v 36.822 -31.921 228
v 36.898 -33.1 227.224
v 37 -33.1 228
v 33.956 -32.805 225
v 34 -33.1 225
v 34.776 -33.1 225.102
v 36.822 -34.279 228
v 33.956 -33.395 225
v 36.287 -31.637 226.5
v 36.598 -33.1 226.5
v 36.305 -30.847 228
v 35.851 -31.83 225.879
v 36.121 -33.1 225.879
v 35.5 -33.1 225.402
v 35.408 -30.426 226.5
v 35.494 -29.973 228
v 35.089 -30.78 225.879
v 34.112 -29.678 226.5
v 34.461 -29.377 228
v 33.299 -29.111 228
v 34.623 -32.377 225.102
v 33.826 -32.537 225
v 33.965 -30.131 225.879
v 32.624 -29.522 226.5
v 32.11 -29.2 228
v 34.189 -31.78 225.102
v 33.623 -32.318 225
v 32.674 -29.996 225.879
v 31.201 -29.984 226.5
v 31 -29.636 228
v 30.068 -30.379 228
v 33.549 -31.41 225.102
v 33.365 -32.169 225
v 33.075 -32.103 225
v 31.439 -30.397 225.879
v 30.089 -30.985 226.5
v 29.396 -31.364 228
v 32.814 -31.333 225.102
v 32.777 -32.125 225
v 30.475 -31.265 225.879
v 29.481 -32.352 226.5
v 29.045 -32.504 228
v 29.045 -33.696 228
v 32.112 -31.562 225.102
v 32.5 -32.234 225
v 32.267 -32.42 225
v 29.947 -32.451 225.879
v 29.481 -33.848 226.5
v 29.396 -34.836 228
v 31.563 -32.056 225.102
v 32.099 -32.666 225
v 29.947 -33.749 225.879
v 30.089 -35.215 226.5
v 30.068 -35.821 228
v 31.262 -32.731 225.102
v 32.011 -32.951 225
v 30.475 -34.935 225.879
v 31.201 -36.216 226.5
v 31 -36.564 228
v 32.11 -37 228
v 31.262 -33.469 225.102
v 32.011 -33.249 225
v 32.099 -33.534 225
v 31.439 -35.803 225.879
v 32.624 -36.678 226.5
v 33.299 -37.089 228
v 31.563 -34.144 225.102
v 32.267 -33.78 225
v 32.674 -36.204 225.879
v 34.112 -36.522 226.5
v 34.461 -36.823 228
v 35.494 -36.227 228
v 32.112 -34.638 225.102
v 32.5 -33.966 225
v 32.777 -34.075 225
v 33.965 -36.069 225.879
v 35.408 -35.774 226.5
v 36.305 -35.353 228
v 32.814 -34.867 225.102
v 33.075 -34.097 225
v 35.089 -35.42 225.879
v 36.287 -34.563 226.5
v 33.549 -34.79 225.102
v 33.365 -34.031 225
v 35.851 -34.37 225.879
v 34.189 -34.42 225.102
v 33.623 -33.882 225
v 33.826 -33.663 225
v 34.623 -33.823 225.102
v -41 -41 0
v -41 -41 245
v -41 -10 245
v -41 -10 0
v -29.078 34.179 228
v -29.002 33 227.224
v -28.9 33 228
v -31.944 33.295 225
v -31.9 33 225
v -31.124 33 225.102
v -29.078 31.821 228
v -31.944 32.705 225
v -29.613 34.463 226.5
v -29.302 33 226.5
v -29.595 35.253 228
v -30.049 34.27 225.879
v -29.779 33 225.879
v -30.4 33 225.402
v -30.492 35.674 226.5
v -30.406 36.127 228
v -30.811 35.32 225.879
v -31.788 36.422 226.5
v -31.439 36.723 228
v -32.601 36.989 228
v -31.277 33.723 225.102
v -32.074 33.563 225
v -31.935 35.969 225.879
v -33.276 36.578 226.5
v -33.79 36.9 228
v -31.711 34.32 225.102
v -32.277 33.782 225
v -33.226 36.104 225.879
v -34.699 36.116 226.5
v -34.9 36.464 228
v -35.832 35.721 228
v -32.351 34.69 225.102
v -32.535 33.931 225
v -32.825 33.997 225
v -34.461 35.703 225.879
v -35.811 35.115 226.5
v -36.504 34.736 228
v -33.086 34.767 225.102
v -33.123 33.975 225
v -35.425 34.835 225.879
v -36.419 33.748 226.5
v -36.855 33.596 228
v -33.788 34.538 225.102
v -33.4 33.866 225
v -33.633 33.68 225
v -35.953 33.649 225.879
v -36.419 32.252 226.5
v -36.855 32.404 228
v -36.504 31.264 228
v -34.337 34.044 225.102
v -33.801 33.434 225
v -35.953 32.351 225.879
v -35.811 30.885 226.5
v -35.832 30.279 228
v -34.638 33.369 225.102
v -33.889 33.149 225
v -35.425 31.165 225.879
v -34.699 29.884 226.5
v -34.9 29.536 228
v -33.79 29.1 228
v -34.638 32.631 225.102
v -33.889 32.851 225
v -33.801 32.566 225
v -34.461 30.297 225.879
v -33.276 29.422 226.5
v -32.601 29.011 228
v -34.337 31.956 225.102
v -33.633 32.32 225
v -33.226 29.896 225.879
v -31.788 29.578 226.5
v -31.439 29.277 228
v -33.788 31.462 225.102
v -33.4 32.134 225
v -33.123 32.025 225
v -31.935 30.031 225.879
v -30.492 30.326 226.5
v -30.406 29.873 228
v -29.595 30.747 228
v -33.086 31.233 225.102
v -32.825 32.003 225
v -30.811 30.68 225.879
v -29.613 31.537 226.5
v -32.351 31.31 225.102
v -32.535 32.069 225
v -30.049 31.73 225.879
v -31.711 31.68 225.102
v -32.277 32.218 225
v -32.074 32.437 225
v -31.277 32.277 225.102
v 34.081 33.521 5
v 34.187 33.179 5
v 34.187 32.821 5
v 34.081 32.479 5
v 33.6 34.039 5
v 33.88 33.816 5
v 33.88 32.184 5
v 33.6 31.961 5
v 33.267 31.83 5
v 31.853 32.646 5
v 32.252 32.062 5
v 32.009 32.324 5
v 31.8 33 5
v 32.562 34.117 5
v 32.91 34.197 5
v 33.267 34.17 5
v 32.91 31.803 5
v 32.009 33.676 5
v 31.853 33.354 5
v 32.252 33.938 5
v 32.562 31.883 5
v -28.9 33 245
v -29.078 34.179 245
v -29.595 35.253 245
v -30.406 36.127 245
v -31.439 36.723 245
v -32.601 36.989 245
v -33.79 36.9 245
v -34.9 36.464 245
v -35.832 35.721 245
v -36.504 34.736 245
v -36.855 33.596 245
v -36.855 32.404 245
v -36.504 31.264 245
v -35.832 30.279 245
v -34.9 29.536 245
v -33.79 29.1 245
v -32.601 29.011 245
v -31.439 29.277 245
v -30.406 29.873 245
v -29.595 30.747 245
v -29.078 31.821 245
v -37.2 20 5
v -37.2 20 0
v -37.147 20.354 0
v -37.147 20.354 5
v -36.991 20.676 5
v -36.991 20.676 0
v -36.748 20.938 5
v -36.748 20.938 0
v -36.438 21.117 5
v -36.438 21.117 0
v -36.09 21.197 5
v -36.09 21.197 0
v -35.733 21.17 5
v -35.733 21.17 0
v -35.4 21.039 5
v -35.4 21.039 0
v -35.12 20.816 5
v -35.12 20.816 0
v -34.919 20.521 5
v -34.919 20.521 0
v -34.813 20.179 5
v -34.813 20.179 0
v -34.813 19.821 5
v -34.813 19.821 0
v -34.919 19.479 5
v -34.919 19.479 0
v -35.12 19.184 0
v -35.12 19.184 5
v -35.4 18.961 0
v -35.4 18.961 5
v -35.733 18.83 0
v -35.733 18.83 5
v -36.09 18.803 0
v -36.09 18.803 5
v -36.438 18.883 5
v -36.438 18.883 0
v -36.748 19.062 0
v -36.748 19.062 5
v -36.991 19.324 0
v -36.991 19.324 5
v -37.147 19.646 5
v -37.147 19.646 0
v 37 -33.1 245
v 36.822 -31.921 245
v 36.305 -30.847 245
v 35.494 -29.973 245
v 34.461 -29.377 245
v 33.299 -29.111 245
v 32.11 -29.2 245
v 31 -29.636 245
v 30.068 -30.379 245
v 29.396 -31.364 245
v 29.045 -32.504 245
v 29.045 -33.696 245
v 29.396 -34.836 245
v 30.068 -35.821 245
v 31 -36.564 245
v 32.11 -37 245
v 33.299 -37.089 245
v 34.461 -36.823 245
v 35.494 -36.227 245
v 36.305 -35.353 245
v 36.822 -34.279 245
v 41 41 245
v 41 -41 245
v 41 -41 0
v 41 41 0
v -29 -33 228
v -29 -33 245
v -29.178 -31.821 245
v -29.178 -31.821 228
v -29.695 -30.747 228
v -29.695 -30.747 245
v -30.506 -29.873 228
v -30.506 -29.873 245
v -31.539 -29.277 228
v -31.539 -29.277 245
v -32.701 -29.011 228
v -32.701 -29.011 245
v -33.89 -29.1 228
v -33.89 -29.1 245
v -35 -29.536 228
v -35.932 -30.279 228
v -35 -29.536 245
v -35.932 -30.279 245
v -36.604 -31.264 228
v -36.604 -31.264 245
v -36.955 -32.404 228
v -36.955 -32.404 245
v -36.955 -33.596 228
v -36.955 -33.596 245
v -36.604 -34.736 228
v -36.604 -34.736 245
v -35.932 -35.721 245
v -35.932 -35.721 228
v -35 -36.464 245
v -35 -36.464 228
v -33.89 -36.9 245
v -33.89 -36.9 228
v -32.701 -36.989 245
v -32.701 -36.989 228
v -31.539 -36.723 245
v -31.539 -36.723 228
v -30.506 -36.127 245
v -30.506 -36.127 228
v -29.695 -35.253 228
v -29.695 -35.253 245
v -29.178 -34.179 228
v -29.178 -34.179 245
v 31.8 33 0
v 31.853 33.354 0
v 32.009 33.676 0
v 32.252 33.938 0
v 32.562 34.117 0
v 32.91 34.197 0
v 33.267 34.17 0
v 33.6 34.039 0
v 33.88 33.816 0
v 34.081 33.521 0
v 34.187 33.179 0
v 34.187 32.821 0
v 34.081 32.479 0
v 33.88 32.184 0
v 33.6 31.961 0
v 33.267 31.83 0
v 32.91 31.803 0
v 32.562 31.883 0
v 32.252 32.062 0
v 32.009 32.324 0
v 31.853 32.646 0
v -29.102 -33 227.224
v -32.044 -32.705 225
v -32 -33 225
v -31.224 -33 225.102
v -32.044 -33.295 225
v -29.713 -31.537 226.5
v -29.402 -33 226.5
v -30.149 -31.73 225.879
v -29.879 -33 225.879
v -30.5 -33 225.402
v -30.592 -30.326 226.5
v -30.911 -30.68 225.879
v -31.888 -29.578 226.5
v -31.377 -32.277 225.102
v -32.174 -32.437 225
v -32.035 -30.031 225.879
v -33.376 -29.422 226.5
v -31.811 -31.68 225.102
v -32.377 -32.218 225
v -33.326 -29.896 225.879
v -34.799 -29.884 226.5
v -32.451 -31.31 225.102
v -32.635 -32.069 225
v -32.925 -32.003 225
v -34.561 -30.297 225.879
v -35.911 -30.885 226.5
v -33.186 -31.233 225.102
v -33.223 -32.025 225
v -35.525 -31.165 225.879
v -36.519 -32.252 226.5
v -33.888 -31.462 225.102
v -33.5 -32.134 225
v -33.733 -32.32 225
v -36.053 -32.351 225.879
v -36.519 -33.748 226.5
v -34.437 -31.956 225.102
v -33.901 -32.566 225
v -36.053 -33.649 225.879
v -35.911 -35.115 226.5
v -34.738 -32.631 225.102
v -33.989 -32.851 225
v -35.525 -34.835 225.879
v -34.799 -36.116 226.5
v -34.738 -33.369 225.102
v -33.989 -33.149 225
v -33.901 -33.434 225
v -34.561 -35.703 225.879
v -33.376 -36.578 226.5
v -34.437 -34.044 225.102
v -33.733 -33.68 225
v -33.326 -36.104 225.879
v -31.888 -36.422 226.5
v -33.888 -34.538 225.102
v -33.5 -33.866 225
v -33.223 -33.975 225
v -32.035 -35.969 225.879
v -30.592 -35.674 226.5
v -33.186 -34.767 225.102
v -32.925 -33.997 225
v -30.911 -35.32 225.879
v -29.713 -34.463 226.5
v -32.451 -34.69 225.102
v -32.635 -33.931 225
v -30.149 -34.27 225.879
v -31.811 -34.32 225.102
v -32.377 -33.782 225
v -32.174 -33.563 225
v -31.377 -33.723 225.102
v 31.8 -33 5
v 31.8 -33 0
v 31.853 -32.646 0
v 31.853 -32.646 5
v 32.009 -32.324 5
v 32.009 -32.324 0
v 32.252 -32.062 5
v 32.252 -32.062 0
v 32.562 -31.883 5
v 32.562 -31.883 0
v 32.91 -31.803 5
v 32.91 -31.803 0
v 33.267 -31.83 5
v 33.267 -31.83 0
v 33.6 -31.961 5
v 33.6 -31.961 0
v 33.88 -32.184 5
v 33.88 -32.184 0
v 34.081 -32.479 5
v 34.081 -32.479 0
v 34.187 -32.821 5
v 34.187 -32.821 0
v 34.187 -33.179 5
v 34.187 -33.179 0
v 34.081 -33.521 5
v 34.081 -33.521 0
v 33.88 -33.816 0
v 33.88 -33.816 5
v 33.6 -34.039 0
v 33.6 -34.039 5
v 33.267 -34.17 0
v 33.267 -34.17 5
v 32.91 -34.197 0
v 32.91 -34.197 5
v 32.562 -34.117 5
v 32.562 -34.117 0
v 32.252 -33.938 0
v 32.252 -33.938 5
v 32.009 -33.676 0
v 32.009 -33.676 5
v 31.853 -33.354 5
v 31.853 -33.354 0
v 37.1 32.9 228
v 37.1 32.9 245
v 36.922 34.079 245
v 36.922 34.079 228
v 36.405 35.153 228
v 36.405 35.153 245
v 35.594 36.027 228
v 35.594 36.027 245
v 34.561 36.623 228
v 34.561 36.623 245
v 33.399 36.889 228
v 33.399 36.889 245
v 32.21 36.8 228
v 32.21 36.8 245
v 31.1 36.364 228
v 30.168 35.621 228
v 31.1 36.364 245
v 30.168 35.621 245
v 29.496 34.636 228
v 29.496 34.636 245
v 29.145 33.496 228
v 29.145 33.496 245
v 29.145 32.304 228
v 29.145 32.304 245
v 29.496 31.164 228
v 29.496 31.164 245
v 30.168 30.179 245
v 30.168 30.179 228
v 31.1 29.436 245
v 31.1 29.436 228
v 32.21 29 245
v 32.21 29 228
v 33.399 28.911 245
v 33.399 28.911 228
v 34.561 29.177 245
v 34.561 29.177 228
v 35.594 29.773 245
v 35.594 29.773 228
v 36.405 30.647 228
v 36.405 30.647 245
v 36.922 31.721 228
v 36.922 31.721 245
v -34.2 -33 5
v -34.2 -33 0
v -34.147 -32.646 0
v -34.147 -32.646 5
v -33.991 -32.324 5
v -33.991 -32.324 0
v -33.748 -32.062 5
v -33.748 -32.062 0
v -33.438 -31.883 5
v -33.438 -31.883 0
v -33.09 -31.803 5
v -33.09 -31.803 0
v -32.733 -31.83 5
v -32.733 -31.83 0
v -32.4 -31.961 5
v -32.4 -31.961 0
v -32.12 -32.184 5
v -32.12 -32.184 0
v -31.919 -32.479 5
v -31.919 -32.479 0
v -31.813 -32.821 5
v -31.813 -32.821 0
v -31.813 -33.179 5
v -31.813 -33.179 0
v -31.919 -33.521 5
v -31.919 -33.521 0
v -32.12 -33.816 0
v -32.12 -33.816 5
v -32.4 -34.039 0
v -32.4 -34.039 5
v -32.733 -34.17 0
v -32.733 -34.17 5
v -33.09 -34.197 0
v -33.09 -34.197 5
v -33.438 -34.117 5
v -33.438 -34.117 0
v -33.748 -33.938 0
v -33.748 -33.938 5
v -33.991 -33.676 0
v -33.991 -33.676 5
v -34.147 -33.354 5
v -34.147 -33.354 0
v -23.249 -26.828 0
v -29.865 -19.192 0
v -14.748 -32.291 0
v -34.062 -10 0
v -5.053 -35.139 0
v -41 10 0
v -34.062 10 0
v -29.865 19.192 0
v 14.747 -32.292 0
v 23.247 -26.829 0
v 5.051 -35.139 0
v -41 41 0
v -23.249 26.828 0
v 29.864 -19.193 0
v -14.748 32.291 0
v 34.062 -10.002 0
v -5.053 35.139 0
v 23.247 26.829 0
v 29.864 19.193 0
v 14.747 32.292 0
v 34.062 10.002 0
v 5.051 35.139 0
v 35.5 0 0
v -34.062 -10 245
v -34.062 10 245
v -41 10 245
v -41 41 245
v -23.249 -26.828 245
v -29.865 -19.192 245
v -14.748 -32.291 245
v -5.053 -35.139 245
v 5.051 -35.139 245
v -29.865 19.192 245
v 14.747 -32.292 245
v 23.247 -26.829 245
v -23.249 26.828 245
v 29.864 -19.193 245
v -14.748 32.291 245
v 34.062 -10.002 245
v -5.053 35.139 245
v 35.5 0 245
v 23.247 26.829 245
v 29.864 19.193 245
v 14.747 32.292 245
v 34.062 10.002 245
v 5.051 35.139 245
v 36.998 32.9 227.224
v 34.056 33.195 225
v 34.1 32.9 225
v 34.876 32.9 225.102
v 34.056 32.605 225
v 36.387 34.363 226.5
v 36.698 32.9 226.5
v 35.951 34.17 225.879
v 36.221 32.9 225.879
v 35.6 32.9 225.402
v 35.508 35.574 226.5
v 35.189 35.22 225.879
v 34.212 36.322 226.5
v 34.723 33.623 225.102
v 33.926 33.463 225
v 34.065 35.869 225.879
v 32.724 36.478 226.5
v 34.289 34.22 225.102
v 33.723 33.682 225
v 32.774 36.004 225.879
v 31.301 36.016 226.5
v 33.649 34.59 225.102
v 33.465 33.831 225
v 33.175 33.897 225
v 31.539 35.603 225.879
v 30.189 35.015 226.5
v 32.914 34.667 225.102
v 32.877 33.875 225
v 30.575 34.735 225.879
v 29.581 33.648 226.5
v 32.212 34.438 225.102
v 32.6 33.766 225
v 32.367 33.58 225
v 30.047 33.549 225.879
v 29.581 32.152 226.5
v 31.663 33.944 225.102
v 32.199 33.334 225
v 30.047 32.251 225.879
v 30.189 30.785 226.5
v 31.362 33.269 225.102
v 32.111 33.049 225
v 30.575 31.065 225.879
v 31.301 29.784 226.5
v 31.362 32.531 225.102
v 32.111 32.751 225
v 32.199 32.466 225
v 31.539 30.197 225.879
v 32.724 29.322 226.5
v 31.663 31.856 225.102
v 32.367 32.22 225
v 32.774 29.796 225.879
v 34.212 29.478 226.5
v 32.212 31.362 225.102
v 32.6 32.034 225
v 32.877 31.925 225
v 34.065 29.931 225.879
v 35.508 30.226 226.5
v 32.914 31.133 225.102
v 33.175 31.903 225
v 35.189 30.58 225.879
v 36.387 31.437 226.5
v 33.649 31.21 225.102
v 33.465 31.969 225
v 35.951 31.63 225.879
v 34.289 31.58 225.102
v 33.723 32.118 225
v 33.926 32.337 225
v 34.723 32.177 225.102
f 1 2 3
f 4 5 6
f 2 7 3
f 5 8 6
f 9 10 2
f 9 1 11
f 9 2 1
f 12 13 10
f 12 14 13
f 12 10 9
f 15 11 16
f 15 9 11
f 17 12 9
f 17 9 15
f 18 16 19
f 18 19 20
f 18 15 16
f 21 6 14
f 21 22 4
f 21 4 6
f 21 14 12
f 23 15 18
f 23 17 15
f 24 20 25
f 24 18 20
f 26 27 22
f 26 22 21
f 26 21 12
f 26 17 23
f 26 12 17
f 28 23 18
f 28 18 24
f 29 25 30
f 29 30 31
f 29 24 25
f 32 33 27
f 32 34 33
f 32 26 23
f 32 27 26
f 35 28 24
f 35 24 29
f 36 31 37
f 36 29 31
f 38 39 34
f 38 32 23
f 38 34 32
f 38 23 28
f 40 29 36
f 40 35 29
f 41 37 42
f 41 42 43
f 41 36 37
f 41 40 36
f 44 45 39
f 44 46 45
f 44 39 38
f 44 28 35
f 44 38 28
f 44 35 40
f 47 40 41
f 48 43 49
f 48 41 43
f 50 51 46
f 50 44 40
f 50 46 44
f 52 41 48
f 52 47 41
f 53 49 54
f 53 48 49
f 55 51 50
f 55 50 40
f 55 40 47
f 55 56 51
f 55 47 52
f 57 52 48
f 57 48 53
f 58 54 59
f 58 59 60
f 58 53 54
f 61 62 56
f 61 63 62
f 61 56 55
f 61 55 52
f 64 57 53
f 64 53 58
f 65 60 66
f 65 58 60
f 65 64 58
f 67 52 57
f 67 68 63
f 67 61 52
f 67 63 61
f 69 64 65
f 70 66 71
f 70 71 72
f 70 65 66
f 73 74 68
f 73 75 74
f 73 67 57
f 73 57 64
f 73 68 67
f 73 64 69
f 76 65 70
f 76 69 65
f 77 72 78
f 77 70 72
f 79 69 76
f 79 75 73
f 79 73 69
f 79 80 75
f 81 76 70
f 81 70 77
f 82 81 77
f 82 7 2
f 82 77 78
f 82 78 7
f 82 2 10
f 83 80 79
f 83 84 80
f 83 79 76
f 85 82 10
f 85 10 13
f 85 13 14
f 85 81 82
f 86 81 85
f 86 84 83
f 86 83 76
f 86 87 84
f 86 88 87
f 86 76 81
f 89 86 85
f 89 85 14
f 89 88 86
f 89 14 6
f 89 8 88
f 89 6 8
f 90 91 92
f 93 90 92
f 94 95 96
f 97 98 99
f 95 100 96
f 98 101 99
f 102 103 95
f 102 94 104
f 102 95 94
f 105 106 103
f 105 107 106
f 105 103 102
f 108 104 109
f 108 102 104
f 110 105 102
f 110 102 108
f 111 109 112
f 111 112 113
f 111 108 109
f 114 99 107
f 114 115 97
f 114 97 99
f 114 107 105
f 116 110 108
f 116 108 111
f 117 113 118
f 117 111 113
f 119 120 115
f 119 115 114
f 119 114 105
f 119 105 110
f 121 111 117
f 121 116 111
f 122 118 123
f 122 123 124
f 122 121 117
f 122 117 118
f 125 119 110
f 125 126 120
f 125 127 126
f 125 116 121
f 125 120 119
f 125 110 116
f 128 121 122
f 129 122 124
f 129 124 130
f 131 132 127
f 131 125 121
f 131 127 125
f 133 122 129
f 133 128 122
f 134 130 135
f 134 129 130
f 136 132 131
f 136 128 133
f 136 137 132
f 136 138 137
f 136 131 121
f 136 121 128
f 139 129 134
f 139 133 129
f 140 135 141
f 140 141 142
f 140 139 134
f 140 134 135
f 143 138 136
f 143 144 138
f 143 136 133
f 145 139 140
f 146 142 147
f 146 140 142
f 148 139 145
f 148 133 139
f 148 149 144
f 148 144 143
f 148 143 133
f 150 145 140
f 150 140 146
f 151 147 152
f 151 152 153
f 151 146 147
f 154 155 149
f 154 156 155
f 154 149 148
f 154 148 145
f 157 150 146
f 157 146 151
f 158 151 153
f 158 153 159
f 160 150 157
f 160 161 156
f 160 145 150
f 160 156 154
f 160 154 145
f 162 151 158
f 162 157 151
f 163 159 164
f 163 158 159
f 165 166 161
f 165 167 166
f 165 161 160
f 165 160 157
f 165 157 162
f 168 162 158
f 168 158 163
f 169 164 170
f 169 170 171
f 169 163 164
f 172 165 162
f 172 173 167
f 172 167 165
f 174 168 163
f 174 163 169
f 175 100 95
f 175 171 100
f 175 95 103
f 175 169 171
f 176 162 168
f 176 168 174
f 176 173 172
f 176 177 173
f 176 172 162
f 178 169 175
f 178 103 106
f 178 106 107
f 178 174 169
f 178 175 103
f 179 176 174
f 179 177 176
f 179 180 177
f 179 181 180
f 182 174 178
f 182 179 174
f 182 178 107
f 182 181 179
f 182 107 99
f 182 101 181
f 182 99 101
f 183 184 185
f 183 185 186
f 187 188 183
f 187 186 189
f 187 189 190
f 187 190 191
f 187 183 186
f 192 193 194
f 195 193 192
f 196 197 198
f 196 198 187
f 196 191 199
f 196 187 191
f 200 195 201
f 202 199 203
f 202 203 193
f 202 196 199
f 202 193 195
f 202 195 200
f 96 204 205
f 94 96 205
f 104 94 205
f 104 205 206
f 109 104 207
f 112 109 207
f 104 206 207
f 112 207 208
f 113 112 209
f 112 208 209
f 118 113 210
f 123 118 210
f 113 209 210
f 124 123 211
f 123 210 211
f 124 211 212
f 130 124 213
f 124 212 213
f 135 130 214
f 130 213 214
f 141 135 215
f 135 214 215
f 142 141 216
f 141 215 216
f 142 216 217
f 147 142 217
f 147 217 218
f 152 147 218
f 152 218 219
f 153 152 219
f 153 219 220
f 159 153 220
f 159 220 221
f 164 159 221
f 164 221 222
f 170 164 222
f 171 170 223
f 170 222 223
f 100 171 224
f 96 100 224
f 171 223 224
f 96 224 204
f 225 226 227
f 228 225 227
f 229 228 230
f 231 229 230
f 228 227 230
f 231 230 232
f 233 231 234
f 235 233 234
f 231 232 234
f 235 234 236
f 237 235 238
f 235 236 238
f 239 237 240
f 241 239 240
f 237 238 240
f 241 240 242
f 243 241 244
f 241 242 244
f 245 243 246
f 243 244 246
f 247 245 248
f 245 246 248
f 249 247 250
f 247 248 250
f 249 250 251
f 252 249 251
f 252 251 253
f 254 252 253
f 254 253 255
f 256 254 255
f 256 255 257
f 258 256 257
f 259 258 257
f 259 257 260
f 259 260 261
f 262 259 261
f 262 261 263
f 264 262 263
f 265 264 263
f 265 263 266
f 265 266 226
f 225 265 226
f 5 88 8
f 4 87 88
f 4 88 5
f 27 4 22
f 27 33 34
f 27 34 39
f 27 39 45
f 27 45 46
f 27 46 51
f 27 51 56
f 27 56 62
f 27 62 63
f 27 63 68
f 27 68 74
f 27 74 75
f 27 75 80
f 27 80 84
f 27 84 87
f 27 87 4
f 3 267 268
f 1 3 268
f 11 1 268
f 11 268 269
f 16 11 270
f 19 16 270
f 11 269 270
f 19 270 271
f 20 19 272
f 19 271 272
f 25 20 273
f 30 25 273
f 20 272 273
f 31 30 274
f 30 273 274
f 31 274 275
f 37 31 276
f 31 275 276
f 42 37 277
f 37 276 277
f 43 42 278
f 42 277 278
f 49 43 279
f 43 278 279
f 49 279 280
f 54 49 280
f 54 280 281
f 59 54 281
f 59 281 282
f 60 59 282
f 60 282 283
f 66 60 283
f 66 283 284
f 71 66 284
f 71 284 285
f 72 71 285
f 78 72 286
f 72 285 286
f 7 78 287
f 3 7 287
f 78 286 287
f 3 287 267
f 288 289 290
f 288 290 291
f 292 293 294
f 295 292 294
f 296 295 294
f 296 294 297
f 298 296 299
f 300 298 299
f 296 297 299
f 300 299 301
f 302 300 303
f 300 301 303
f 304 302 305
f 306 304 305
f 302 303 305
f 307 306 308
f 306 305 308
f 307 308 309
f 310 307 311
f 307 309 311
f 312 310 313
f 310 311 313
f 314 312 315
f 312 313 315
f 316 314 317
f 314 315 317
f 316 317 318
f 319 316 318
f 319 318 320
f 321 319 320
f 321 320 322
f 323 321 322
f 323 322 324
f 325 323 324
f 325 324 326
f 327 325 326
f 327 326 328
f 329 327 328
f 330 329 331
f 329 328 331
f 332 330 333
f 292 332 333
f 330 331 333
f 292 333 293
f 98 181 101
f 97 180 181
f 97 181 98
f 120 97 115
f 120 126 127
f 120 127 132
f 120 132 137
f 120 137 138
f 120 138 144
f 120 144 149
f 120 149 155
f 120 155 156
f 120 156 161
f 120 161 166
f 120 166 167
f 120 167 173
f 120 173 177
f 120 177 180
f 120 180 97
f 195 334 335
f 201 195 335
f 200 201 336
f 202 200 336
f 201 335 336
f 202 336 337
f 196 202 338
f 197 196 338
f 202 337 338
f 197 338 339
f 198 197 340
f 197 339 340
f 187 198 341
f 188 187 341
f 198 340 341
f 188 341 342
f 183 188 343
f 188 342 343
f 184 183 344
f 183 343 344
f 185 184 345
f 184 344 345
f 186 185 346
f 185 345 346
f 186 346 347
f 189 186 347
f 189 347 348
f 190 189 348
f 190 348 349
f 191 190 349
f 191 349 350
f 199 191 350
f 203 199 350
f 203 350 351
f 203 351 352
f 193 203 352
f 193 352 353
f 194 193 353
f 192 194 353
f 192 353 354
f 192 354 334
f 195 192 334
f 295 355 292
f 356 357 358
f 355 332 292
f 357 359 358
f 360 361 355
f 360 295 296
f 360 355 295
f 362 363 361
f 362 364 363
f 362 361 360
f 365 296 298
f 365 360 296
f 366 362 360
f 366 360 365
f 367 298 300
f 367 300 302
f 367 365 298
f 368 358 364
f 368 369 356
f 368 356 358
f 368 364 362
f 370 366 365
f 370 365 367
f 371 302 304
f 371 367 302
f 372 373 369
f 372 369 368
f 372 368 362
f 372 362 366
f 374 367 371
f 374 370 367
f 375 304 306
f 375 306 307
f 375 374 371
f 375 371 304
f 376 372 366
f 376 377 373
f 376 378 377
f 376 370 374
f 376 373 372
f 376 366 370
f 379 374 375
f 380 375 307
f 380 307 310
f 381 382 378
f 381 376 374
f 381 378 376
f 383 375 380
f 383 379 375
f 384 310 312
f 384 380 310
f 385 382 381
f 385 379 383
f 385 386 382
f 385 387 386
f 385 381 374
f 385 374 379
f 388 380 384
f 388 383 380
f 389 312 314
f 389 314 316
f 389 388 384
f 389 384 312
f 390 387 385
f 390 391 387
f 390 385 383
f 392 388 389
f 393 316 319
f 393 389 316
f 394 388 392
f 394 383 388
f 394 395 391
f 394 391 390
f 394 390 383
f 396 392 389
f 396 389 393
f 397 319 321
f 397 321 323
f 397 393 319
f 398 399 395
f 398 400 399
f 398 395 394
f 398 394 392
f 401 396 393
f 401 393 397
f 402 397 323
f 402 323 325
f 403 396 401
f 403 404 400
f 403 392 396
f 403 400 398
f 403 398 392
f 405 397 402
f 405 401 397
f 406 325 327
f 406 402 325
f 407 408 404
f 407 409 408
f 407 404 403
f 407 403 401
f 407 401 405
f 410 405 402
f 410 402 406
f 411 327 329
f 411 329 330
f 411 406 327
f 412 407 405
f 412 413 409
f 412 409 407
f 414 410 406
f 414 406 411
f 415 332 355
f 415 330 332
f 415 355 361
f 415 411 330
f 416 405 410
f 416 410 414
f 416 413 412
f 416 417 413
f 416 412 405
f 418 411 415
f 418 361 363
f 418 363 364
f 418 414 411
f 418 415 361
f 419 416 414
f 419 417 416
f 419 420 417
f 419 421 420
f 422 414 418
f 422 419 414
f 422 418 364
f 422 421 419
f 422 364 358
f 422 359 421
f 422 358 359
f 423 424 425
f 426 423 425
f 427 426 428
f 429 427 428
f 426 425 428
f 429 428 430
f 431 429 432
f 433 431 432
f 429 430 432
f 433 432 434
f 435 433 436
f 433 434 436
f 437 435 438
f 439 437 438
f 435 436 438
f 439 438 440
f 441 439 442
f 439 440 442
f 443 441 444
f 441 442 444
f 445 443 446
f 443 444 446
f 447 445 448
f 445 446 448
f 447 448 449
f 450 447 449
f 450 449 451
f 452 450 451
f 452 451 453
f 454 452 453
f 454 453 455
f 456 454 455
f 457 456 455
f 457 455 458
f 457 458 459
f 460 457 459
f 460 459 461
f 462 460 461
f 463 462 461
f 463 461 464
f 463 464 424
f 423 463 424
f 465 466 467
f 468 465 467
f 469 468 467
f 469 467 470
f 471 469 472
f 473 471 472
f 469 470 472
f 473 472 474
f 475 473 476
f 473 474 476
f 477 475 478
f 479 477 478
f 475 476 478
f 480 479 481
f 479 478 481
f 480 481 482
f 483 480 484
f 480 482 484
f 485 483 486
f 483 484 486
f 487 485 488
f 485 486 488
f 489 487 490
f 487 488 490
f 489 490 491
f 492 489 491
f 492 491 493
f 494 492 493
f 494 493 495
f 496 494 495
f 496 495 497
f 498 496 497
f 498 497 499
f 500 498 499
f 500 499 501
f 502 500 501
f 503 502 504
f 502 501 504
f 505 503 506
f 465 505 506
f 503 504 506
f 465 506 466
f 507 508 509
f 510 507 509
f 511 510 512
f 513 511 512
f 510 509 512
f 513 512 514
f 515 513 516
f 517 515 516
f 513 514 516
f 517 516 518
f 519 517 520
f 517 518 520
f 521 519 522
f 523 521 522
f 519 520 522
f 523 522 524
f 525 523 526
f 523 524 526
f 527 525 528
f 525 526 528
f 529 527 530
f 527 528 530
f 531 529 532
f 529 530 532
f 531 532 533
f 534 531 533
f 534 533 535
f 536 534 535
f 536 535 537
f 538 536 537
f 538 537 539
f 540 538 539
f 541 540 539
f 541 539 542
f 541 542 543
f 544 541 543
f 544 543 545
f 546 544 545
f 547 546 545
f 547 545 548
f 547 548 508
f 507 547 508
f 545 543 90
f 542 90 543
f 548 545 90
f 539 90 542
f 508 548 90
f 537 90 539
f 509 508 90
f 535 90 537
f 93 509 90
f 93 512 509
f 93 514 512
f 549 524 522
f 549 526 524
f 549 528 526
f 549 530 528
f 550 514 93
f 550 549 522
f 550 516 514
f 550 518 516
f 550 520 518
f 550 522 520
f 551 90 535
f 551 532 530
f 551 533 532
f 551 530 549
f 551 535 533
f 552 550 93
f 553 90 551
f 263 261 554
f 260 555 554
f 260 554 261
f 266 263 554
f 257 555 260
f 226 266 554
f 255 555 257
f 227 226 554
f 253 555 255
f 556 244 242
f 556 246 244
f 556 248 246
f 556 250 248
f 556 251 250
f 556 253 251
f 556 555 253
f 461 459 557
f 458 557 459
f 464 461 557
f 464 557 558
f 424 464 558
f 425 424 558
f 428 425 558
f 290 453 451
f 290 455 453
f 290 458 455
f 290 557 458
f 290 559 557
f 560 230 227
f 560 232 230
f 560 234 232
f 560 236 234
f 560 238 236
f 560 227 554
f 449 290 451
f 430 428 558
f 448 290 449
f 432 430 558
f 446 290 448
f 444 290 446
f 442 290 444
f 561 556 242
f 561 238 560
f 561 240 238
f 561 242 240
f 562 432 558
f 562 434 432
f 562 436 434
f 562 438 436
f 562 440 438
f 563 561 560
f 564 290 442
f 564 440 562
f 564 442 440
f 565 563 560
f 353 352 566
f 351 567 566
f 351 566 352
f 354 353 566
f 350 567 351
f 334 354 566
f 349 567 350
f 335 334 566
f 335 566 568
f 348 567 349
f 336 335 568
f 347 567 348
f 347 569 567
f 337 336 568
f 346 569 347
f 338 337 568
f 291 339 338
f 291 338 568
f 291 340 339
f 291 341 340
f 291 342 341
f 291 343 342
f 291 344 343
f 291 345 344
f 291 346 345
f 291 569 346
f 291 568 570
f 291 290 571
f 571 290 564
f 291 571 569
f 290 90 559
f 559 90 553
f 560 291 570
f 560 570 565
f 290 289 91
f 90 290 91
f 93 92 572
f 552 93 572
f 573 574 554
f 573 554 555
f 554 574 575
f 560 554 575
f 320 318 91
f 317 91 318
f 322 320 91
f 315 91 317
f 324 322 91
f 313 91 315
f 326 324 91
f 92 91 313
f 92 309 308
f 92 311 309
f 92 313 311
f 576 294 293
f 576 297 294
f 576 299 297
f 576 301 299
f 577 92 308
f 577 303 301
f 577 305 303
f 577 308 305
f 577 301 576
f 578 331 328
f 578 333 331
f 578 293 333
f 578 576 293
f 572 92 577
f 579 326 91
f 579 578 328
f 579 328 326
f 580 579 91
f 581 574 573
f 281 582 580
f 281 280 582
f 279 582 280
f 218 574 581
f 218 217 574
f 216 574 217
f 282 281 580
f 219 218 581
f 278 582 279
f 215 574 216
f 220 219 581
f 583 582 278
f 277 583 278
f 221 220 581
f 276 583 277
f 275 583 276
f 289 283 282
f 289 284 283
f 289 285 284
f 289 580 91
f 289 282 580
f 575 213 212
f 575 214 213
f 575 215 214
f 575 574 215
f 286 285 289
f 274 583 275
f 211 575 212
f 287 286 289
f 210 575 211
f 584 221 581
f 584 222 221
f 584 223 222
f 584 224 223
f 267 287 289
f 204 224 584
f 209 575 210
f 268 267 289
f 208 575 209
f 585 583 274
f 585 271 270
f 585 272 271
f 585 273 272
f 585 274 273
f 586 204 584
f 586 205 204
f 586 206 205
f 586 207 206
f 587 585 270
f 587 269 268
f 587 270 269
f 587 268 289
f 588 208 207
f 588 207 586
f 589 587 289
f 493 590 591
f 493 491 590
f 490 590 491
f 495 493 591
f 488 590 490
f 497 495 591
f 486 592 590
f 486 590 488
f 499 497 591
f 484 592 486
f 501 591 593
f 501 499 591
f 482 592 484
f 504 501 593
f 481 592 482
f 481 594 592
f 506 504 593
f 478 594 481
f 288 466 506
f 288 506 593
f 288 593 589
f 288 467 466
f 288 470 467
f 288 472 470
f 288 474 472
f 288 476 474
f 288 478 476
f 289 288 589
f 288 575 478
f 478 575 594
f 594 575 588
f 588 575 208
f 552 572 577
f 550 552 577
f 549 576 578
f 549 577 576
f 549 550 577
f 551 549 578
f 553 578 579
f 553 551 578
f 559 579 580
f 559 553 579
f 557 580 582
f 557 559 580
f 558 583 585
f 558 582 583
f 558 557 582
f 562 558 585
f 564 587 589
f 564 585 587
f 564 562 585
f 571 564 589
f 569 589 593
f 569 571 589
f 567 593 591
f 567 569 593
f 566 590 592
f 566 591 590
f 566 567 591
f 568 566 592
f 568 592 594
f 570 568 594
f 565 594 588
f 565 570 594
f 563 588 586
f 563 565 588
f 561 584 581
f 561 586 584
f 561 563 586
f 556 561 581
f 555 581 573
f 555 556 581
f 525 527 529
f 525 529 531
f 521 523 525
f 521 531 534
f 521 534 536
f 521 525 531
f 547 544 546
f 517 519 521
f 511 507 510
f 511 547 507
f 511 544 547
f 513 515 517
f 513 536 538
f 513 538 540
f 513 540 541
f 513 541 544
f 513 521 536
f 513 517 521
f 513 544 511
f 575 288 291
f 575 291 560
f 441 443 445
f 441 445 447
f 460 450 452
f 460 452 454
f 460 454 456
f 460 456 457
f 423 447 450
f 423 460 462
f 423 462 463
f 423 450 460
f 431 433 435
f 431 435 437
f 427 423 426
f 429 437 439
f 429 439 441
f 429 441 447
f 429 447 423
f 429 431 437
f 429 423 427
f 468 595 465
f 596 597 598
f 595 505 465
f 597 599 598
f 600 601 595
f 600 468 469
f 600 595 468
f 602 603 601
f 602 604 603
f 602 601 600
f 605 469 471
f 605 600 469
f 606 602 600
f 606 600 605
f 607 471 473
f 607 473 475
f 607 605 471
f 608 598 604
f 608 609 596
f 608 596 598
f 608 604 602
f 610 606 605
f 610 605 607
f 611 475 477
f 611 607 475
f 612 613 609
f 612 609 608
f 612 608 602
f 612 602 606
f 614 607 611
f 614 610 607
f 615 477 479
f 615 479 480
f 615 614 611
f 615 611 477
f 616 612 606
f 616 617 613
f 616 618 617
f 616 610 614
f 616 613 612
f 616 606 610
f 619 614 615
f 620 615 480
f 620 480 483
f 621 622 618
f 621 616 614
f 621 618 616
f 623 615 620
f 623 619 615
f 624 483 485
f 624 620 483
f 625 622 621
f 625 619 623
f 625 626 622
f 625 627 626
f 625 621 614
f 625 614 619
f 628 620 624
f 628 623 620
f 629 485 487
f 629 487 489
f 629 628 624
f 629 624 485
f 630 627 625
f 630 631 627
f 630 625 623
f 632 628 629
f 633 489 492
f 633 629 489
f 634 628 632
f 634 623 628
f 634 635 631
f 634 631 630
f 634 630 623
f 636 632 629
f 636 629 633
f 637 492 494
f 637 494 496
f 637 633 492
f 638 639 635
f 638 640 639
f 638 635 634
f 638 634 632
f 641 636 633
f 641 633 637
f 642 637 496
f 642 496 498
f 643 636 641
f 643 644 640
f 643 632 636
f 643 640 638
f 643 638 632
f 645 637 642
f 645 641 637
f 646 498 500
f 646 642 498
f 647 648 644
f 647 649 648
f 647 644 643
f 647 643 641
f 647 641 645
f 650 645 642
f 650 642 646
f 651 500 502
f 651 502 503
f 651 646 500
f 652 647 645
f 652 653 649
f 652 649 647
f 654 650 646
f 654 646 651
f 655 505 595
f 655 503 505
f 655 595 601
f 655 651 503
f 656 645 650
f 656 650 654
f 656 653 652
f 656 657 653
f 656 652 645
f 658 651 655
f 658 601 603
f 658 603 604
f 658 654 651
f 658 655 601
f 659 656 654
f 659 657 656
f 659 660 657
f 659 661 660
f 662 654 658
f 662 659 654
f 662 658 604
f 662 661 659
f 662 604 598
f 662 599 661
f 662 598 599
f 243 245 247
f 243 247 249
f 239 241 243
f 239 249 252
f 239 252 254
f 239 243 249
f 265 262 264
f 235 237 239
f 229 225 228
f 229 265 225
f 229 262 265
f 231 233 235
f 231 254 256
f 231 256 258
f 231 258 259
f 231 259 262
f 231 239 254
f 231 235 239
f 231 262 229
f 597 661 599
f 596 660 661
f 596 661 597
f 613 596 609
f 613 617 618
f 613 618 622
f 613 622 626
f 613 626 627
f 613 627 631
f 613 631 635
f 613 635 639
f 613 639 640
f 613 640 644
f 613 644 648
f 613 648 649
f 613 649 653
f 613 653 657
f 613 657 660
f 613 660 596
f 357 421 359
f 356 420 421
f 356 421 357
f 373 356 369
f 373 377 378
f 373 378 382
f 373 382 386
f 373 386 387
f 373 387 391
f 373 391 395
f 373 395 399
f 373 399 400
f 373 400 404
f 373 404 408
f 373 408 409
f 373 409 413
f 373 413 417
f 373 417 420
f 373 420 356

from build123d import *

# Parameters (mm, degrees)
SKETCH_1_W               = 82
SKETCH_1_H               = 82
SKETCH_1_R               = 35.5
EXTRUDE_1_DEPTH          = 245
SKETCH_2_W               = 82
SKETCH_2_H               = 82
EXTRUDE_2_DEPTH          = 27
SKETCH_3_W               = 8
SKETCH_3_H               = 20
CUT_EXTRUDE_1_DEPTH      = 245
SKETCH_4_R               = 4
CUT_EXTRUDE_2_DEPTH      = 20
FILLET_2_R               = 3
FILLET_3_R               = 3
FILLET_4_R               = 3
FILLET_5_R               = 3
SKETCH_5_R               = 1.05
CUT_EXTRUDE_3_DEPTH      = 10
EXTRUDE_START            = 0.2
SKETCH_6_R               = 1.05
EXTRUDE_3_DEPTH          = 0.2
CUT_EXTRUDE_5_REACH      = 263.591
SKETCH_7_W               = 20
SKETCH_7_H               = 65
CUT_EXTRUDE_6_REACH      = 263.591
SKETCH_8_W               = 41
SKETCH_8_H               = 20
SKETCH_9_R               = 1.2
CUT_EXTRUDE_7_DEPTH      = 12
CUT_EXTRUDE_8_DEPTH      = 262.591284258
CUT_EXTRUDE_8_DEPTH_BACK = 262.591284258
SKETCH_10_W              = 27
SKETCH_10_H              = 82


with BuildPart() as part:
    # 草圖1 → 填料-伸長1 (new body)
    with BuildSketch(Plane.XY):
        Rectangle(SKETCH_1_W, SKETCH_1_H)
        Circle(SKETCH_1_R, mode=Mode.SUBTRACT)
    extrude(amount=EXTRUDE_1_DEPTH)

    # 草圖2 → 填料-伸長2 (add)
    with BuildSketch(Plane(origin=(0, 0, 0), x_dir=(-1, 0, 0), z_dir=(0, 0, -1))):
        Rectangle(SKETCH_2_W, SKETCH_2_H)
    extrude(amount=EXTRUDE_2_DEPTH)

    # 草圖3 → 除料-伸長1 (cut)
    with BuildSketch(Plane.XY.offset(245)):
        with Locations((-37, 0)):
            Rectangle(SKETCH_3_W, SKETCH_3_H)
    extrude(amount=-CUT_EXTRUDE_1_DEPTH, mode=Mode.SUBTRACT)

    # 草圖4 → 除料-伸長2 (cut)
    with BuildSketch(Plane.XY.offset(245)):
        with Locations((-32.9, 33)):
            Circle(SKETCH_4_R)
        with Locations((33.1, 32.9)):
            Circle(SKETCH_4_R)
        with Locations((33, -33.1)):
            Circle(SKETCH_4_R)
        with Locations((-33, -33)):
            Circle(SKETCH_4_R)
    extrude(amount=-CUT_EXTRUDE_2_DEPTH, mode=Mode.SUBTRACT)

    # 圓角2
    fillet_2_edges = [part.edges().sort_by_distance(p)[0] for p in [
        (-36.9, 33, 225),
    ]]
    fillet(fillet_2_edges, radius=FILLET_2_R)

    # 圓角3
    fillet_3_edges = [part.edges().sort_by_distance(p)[0] for p in [
        (29.1, 32.9, 225),
    ]]
    fillet(fillet_3_edges, radius=FILLET_3_R)

    # 圓角4
    fillet_4_edges = [part.edges().sort_by_distance(p)[0] for p in [
        (-37, -33, 225),
    ]]
    fillet(fillet_4_edges, radius=FILLET_4_R)

    # 圓角5
    fillet_5_edges = [part.edges().sort_by_distance(p)[0] for p in [
        (29, -33.1, 225),
    ]]
    fillet(fillet_5_edges, radius=FILLET_5_R)

    # 草圖5 → 除料-伸長3 (cut)
    with BuildSketch(Plane(origin=(0, 41, 0), x_dir=(1, 0, 0), z_dir=(0, 1, 0))):
        with Locations(Location((-36.75, 22.75, 0), (0, 0, 270))):
            Circle(SKETCH_5_R)
        with Locations(Location((-36.75, 4.75, 0), (0, 0, 270))):
            Circle(SKETCH_5_R)
    extrude(amount=-CUT_EXTRUDE_3_DEPTH, mode=Mode.SUBTRACT)

    # 草圖6 → 填料-伸長3 (add)
    with BuildSketch(Plane(origin=(0, 35, 0), x_dir=(1, 0, 0), z_dir=(0, 1, 0)).offset(EXTRUDE_START)):
        with Locations(Location((-36.75, 22.75, 0), (0, 0, 270))):
            Circle(SKETCH_6_R)
        with Locations(Location((-36.75, 4.75, 0), (0, 0, 270))):
            Circle(SKETCH_6_R)
    extrude(amount=-EXTRUDE_3_DEPTH)

    # 草圖7 → 除料-伸長5 (cut, up to next)
    with BuildSketch(Plane(origin=(-41, 0, 0), x_dir=(0, 0, -1), z_dir=(1, 0, 0)), mode=Mode.PRIVATE) as cut_extrude_5_sk1:
        with Locations((17, -8.5)):
            Rectangle(SKETCH_7_W, SKETCH_7_H)
    cut_extrude_5_tool1 = extrude(cut_extrude_5_sk1.sketch, amount=CUT_EXTRUDE_5_REACH, mode=Mode.PRIVATE) & part.part
    add(cut_extrude_5_tool1.solids().sort_by_distance((-41, -8.5, -17))[0], mode=Mode.SUBTRACT)

    # 草圖8 → 除料-伸長6 (cut, up to next)
    with BuildSketch(Plane(origin=(0, 41, 0), x_dir=(1, 0, 0), z_dir=(0, 1, 0)), mode=Mode.PRIVATE) as cut_extrude_6_sk1:
        with Locations((20.5, 17)):
            Rectangle(SKETCH_8_W, SKETCH_8_H)
    cut_extrude_6_tool1 = extrude(cut_extrude_6_sk1.sketch, amount=-CUT_EXTRUDE_6_REACH, mode=Mode.PRIVATE) & part.part
    add(cut_extrude_6_tool1.solids().sort_by_distance((20.5, 41, -17))[0], mode=Mode.SUBTRACT)

    # 草圖9 → 除料-伸長7 (cut)
    with BuildSketch(Plane(origin=(0, 0, -7), x_dir=(-1, 0, 0), z_dir=(0, 0, -1))):
        with Locations((-33, 33)):
            Circle(SKETCH_9_R)
        with Locations((-33, -33)):
            Circle(SKETCH_9_R)
        with Locations((33, -33)):
            Circle(SKETCH_9_R)
        with Locations((36, 20)):
            Circle(SKETCH_9_R)
    extrude(amount=-CUT_EXTRUDE_7_DEPTH, mode=Mode.SUBTRACT)

    # 草圖10 → 除料-伸長8 (cut, two sides: drawn at the far end of the back side and taken through both)
    with BuildSketch(Plane.ZY.offset(41).offset(-CUT_EXTRUDE_8_DEPTH_BACK)):
        with Locations((-13.5, 0)):
            Rectangle(SKETCH_10_W, SKETCH_10_H)
    extrude(amount=CUT_EXTRUDE_8_DEPTH + CUT_EXTRUDE_8_DEPTH_BACK, mode=Mode.SUBTRACT)


solid = part.part
